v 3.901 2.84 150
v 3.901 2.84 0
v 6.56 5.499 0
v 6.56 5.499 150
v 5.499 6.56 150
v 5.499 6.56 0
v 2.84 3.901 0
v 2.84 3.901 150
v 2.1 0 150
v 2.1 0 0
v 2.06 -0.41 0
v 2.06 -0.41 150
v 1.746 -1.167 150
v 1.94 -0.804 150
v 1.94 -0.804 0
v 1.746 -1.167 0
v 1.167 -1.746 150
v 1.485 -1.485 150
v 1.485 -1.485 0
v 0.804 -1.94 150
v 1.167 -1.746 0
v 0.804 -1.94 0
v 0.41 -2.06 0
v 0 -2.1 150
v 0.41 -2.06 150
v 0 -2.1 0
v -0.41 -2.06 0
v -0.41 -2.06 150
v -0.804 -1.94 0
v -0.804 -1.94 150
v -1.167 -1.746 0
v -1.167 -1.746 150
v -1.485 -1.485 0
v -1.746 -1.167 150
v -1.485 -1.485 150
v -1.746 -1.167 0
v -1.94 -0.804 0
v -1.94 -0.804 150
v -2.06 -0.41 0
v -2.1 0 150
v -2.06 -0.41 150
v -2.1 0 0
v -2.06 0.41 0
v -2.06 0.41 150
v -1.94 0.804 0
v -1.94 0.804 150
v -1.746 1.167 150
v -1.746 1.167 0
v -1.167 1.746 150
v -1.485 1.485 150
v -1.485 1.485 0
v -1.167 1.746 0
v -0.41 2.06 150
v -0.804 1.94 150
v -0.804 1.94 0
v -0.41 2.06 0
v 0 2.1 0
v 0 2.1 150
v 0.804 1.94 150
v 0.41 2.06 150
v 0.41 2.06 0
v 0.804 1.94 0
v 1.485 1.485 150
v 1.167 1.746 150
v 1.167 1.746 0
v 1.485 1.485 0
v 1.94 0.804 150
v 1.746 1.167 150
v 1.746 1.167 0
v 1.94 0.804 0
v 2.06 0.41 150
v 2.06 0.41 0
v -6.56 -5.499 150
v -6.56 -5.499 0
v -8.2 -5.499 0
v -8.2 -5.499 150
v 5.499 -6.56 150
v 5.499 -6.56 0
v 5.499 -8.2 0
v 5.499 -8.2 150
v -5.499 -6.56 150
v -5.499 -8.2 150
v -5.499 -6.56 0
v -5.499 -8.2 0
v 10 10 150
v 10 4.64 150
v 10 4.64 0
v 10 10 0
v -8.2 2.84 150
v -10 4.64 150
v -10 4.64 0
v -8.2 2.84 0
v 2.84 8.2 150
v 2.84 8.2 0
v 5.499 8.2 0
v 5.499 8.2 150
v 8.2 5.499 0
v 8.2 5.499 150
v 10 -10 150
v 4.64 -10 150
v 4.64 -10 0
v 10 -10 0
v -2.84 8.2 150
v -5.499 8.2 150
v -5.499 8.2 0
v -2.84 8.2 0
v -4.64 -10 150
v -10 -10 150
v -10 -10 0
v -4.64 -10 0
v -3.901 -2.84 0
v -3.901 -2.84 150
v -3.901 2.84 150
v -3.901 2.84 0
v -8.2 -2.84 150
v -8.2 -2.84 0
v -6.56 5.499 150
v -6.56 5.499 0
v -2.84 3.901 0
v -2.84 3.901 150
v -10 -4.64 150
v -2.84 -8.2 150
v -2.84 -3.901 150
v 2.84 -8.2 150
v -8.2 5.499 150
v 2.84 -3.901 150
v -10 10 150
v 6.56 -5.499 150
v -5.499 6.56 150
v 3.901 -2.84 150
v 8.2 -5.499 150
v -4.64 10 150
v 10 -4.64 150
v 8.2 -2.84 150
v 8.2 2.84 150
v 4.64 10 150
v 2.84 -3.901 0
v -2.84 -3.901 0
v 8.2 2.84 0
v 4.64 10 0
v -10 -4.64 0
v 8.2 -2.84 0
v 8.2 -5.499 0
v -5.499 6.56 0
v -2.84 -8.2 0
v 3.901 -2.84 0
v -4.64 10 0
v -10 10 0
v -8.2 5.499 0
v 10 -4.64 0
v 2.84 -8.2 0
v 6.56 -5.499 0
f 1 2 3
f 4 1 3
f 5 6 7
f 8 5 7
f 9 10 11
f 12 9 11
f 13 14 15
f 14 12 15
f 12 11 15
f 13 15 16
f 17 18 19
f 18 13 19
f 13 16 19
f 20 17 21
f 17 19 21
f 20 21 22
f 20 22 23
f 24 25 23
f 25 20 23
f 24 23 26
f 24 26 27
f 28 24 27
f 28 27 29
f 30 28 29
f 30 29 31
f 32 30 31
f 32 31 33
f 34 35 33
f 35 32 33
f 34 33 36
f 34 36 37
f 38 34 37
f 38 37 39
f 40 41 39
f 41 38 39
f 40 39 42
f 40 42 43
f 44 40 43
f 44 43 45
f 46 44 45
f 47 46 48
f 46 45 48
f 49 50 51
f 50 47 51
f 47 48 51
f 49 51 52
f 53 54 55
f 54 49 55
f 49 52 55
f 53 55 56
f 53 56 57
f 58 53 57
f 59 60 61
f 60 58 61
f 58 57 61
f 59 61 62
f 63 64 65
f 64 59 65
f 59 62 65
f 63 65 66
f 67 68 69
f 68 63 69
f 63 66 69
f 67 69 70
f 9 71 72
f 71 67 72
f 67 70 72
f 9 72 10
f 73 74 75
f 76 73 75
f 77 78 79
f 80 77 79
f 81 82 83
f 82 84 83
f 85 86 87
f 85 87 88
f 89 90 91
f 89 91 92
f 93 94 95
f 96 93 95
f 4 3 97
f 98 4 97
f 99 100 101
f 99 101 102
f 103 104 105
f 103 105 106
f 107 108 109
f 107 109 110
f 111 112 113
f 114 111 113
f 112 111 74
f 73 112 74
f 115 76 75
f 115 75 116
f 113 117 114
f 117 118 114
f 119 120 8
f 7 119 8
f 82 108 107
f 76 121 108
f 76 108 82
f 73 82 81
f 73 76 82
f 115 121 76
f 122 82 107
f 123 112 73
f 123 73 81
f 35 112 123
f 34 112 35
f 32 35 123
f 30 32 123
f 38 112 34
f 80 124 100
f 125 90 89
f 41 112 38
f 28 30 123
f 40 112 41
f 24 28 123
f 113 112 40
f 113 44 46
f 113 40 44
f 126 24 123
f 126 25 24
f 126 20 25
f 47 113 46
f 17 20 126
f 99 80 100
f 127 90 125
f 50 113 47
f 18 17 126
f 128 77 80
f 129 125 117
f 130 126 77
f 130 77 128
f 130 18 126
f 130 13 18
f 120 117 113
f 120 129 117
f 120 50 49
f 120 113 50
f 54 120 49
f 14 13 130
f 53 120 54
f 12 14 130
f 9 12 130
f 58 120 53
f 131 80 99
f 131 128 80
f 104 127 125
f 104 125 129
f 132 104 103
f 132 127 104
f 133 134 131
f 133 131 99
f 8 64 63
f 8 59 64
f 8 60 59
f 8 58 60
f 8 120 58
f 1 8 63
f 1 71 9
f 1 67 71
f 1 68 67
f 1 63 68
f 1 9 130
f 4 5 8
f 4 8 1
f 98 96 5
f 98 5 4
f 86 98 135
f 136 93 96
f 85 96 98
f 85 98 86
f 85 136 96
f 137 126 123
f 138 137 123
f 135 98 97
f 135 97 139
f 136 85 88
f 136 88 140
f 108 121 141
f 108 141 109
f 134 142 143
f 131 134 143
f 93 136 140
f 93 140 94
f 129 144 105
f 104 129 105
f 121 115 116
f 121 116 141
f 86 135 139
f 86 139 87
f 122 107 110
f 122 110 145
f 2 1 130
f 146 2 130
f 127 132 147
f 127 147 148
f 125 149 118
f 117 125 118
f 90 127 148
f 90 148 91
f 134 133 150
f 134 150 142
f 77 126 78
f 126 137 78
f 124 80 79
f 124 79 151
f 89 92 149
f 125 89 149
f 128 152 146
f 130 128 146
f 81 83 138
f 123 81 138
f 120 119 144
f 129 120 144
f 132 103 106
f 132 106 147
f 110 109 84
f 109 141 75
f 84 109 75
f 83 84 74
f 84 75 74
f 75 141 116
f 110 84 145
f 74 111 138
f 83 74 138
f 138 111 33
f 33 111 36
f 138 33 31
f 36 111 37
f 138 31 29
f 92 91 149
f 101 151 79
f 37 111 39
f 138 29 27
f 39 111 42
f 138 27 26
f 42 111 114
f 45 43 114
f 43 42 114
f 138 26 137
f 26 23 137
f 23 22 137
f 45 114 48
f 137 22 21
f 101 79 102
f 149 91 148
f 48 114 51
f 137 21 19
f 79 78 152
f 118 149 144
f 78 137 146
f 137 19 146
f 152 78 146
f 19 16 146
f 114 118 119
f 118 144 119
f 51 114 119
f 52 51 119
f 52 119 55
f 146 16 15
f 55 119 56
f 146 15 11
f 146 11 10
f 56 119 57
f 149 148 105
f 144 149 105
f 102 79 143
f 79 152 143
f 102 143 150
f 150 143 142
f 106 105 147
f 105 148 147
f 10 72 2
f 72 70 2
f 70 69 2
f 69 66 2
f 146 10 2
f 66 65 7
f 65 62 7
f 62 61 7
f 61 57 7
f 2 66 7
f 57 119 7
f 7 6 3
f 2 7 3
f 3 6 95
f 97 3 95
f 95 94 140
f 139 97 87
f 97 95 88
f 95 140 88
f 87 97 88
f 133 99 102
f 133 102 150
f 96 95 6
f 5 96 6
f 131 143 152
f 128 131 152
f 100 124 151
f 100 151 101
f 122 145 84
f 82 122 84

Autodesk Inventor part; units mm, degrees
ref_plane "YZ Plane" through (0, 0, 0) normal (1, 0, 0) x (0, 1, 0)
ref_plane "XZ Plane" through (0, 0, 0) normal (0, 1, 0) x (-1, 0, 0)
ref_plane "XY Plane" through (0, 0, 0) normal (0, 0, 1) x (1, 0, 0)
sketch "Sketch1" plane through (0, 0, 0) normal (0, 0, 1) x (1, 0, 0)
  line L0 (-3.9007, 3.9007) -> (3.9007, 3.9007)
  line L1 (3.9007, 3.9007) -> (3.9007, -3.9007)
  line L2 (3.9007, -3.9007) -> (-3.9007, -3.9007)
  line L3 (-3.9007, -3.9007) -> (-3.9007, 3.9007)
  line L4 (0, 3.9007) -> (0, -3.9007) construction
  line L5 (-3.9007, 0) -> (3.9007, 0) construction
  circle A0 centre (0, 0) radius 2.1
  line L6 (0, 0) -> (-16.1173, 16.1173) construction
  line L7 (0, 0) -> (22.7933, 0) construction
  line L8 (-2.84, 3.9007) -> (-5.4993, 6.56)
  line L9 (-5.4993, 6.56) -> (-5.4993, 8.2)
  line L10 (-5.4993, 8.2) -> (-2.84, 8.2)
  line L11 (-2.84, 8.2) -> (-4.64, 10)
  line L12 (-4.64, 10) -> (-10, 10)
  line L13 (-10, 10) -> (-10, 4.64)
  line L14 (-10, 4.64) -> (-8.2, 2.84)
  line L15 (-8.2, 2.84) -> (-8.2, 5.4993)
  line L16 (-8.2, 5.4993) -> (-6.56, 5.4993)
  line L17 (-6.56, 5.4993) -> (-3.9007, 2.84)
  line L18 (-3.9007, 2.84) -> (-11.3102, 2.84) construction
  line L19 (-2.84, 3.9007) -> (-3.9007, 3.9007)
  line L20 (-3.9007, 2.84) -> (-3.9007, 3.9007)
  line L21 (-3.9007, -2.84) -> (-6.56, -5.4993)
  line L22 (-6.56, -5.4993) -> (-8.2, -5.4993)
  line L23 (-8.2, -5.4993) -> (-8.2, -2.84)
  line L24 (-8.2, -2.84) -> (-10, -4.64)
  line L25 (-10, -4.64) -> (-10, -10)
  line L26 (-10, -10) -> (-4.64, -10)
  line L27 (-4.64, -10) -> (-2.84, -8.2)
  line L28 (-2.84, -8.2) -> (-5.4993, -8.2)
  line L29 (-5.4993, -8.2) -> (-5.4993, -6.56)
  line L30 (-5.4993, -6.56) -> (-2.84, -3.9007)
  line L31 (-3.9007, -2.84) -> (-3.9007, -3.9007)
  line L32 (-2.84, -3.9007) -> (-3.9007, -3.9007)
  line L33 (2.84, -3.9007) -> (5.4993, -6.56)
  line L34 (5.4993, -6.56) -> (5.4993, -8.2)
  line L35 (5.4993, -8.2) -> (2.84, -8.2)
  line L36 (2.84, -8.2) -> (4.64, -10)
  line L37 (4.64, -10) -> (10, -10)
  line L38 (10, -10) -> (10, -4.64)
  line L39 (10, -4.64) -> (8.2, -2.84)
  line L40 (8.2, -2.84) -> (8.2, -5.4993)
  line L41 (8.2, -5.4993) -> (6.56, -5.4993)
  line L42 (6.56, -5.4993) -> (3.9007, -2.84)
  line L43 (2.84, -3.9007) -> (3.9007, -3.9007)
  line L44 (3.9007, -2.84) -> (3.9007, -3.9007)
  line L45 (3.9007, 2.84) -> (6.56, 5.4993)
  line L46 (6.56, 5.4993) -> (8.2, 5.4993)
  line L47 (8.2, 5.4993) -> (8.2, 2.84)
  line L48 (8.2, 2.84) -> (10, 4.64)
  line L49 (10, 4.64) -> (10, 10)
  line L50 (10, 10) -> (4.64, 10)
  line L51 (4.64, 10) -> (2.84, 8.2)
  line L52 (2.84, 8.2) -> (5.4993, 8.2)
  line L53 (5.4993, 8.2) -> (5.4993, 6.56)
  line L54 (5.4993, 6.56) -> (2.84, 3.9007)
  line L55 (3.9007, 2.84) -> (3.9007, 3.9007)
  line L56 (2.84, 3.9007) -> (3.9007, 3.9007)
  dimension "d7" = 4.2
  dimension "d8" = 135
  dimension "d9" = 1.5
  dimension "d10" = 1.64
  dimension "d11" = 1.8
  dimension "d12" = 2.84
  dimension "d13" = 10
  dimension "d16" = 360
extrude "Extrusion1" add sketch "Sketch1" along normal blind 150
properties part number "20x20x250mm" material "Aluminum 6061"
